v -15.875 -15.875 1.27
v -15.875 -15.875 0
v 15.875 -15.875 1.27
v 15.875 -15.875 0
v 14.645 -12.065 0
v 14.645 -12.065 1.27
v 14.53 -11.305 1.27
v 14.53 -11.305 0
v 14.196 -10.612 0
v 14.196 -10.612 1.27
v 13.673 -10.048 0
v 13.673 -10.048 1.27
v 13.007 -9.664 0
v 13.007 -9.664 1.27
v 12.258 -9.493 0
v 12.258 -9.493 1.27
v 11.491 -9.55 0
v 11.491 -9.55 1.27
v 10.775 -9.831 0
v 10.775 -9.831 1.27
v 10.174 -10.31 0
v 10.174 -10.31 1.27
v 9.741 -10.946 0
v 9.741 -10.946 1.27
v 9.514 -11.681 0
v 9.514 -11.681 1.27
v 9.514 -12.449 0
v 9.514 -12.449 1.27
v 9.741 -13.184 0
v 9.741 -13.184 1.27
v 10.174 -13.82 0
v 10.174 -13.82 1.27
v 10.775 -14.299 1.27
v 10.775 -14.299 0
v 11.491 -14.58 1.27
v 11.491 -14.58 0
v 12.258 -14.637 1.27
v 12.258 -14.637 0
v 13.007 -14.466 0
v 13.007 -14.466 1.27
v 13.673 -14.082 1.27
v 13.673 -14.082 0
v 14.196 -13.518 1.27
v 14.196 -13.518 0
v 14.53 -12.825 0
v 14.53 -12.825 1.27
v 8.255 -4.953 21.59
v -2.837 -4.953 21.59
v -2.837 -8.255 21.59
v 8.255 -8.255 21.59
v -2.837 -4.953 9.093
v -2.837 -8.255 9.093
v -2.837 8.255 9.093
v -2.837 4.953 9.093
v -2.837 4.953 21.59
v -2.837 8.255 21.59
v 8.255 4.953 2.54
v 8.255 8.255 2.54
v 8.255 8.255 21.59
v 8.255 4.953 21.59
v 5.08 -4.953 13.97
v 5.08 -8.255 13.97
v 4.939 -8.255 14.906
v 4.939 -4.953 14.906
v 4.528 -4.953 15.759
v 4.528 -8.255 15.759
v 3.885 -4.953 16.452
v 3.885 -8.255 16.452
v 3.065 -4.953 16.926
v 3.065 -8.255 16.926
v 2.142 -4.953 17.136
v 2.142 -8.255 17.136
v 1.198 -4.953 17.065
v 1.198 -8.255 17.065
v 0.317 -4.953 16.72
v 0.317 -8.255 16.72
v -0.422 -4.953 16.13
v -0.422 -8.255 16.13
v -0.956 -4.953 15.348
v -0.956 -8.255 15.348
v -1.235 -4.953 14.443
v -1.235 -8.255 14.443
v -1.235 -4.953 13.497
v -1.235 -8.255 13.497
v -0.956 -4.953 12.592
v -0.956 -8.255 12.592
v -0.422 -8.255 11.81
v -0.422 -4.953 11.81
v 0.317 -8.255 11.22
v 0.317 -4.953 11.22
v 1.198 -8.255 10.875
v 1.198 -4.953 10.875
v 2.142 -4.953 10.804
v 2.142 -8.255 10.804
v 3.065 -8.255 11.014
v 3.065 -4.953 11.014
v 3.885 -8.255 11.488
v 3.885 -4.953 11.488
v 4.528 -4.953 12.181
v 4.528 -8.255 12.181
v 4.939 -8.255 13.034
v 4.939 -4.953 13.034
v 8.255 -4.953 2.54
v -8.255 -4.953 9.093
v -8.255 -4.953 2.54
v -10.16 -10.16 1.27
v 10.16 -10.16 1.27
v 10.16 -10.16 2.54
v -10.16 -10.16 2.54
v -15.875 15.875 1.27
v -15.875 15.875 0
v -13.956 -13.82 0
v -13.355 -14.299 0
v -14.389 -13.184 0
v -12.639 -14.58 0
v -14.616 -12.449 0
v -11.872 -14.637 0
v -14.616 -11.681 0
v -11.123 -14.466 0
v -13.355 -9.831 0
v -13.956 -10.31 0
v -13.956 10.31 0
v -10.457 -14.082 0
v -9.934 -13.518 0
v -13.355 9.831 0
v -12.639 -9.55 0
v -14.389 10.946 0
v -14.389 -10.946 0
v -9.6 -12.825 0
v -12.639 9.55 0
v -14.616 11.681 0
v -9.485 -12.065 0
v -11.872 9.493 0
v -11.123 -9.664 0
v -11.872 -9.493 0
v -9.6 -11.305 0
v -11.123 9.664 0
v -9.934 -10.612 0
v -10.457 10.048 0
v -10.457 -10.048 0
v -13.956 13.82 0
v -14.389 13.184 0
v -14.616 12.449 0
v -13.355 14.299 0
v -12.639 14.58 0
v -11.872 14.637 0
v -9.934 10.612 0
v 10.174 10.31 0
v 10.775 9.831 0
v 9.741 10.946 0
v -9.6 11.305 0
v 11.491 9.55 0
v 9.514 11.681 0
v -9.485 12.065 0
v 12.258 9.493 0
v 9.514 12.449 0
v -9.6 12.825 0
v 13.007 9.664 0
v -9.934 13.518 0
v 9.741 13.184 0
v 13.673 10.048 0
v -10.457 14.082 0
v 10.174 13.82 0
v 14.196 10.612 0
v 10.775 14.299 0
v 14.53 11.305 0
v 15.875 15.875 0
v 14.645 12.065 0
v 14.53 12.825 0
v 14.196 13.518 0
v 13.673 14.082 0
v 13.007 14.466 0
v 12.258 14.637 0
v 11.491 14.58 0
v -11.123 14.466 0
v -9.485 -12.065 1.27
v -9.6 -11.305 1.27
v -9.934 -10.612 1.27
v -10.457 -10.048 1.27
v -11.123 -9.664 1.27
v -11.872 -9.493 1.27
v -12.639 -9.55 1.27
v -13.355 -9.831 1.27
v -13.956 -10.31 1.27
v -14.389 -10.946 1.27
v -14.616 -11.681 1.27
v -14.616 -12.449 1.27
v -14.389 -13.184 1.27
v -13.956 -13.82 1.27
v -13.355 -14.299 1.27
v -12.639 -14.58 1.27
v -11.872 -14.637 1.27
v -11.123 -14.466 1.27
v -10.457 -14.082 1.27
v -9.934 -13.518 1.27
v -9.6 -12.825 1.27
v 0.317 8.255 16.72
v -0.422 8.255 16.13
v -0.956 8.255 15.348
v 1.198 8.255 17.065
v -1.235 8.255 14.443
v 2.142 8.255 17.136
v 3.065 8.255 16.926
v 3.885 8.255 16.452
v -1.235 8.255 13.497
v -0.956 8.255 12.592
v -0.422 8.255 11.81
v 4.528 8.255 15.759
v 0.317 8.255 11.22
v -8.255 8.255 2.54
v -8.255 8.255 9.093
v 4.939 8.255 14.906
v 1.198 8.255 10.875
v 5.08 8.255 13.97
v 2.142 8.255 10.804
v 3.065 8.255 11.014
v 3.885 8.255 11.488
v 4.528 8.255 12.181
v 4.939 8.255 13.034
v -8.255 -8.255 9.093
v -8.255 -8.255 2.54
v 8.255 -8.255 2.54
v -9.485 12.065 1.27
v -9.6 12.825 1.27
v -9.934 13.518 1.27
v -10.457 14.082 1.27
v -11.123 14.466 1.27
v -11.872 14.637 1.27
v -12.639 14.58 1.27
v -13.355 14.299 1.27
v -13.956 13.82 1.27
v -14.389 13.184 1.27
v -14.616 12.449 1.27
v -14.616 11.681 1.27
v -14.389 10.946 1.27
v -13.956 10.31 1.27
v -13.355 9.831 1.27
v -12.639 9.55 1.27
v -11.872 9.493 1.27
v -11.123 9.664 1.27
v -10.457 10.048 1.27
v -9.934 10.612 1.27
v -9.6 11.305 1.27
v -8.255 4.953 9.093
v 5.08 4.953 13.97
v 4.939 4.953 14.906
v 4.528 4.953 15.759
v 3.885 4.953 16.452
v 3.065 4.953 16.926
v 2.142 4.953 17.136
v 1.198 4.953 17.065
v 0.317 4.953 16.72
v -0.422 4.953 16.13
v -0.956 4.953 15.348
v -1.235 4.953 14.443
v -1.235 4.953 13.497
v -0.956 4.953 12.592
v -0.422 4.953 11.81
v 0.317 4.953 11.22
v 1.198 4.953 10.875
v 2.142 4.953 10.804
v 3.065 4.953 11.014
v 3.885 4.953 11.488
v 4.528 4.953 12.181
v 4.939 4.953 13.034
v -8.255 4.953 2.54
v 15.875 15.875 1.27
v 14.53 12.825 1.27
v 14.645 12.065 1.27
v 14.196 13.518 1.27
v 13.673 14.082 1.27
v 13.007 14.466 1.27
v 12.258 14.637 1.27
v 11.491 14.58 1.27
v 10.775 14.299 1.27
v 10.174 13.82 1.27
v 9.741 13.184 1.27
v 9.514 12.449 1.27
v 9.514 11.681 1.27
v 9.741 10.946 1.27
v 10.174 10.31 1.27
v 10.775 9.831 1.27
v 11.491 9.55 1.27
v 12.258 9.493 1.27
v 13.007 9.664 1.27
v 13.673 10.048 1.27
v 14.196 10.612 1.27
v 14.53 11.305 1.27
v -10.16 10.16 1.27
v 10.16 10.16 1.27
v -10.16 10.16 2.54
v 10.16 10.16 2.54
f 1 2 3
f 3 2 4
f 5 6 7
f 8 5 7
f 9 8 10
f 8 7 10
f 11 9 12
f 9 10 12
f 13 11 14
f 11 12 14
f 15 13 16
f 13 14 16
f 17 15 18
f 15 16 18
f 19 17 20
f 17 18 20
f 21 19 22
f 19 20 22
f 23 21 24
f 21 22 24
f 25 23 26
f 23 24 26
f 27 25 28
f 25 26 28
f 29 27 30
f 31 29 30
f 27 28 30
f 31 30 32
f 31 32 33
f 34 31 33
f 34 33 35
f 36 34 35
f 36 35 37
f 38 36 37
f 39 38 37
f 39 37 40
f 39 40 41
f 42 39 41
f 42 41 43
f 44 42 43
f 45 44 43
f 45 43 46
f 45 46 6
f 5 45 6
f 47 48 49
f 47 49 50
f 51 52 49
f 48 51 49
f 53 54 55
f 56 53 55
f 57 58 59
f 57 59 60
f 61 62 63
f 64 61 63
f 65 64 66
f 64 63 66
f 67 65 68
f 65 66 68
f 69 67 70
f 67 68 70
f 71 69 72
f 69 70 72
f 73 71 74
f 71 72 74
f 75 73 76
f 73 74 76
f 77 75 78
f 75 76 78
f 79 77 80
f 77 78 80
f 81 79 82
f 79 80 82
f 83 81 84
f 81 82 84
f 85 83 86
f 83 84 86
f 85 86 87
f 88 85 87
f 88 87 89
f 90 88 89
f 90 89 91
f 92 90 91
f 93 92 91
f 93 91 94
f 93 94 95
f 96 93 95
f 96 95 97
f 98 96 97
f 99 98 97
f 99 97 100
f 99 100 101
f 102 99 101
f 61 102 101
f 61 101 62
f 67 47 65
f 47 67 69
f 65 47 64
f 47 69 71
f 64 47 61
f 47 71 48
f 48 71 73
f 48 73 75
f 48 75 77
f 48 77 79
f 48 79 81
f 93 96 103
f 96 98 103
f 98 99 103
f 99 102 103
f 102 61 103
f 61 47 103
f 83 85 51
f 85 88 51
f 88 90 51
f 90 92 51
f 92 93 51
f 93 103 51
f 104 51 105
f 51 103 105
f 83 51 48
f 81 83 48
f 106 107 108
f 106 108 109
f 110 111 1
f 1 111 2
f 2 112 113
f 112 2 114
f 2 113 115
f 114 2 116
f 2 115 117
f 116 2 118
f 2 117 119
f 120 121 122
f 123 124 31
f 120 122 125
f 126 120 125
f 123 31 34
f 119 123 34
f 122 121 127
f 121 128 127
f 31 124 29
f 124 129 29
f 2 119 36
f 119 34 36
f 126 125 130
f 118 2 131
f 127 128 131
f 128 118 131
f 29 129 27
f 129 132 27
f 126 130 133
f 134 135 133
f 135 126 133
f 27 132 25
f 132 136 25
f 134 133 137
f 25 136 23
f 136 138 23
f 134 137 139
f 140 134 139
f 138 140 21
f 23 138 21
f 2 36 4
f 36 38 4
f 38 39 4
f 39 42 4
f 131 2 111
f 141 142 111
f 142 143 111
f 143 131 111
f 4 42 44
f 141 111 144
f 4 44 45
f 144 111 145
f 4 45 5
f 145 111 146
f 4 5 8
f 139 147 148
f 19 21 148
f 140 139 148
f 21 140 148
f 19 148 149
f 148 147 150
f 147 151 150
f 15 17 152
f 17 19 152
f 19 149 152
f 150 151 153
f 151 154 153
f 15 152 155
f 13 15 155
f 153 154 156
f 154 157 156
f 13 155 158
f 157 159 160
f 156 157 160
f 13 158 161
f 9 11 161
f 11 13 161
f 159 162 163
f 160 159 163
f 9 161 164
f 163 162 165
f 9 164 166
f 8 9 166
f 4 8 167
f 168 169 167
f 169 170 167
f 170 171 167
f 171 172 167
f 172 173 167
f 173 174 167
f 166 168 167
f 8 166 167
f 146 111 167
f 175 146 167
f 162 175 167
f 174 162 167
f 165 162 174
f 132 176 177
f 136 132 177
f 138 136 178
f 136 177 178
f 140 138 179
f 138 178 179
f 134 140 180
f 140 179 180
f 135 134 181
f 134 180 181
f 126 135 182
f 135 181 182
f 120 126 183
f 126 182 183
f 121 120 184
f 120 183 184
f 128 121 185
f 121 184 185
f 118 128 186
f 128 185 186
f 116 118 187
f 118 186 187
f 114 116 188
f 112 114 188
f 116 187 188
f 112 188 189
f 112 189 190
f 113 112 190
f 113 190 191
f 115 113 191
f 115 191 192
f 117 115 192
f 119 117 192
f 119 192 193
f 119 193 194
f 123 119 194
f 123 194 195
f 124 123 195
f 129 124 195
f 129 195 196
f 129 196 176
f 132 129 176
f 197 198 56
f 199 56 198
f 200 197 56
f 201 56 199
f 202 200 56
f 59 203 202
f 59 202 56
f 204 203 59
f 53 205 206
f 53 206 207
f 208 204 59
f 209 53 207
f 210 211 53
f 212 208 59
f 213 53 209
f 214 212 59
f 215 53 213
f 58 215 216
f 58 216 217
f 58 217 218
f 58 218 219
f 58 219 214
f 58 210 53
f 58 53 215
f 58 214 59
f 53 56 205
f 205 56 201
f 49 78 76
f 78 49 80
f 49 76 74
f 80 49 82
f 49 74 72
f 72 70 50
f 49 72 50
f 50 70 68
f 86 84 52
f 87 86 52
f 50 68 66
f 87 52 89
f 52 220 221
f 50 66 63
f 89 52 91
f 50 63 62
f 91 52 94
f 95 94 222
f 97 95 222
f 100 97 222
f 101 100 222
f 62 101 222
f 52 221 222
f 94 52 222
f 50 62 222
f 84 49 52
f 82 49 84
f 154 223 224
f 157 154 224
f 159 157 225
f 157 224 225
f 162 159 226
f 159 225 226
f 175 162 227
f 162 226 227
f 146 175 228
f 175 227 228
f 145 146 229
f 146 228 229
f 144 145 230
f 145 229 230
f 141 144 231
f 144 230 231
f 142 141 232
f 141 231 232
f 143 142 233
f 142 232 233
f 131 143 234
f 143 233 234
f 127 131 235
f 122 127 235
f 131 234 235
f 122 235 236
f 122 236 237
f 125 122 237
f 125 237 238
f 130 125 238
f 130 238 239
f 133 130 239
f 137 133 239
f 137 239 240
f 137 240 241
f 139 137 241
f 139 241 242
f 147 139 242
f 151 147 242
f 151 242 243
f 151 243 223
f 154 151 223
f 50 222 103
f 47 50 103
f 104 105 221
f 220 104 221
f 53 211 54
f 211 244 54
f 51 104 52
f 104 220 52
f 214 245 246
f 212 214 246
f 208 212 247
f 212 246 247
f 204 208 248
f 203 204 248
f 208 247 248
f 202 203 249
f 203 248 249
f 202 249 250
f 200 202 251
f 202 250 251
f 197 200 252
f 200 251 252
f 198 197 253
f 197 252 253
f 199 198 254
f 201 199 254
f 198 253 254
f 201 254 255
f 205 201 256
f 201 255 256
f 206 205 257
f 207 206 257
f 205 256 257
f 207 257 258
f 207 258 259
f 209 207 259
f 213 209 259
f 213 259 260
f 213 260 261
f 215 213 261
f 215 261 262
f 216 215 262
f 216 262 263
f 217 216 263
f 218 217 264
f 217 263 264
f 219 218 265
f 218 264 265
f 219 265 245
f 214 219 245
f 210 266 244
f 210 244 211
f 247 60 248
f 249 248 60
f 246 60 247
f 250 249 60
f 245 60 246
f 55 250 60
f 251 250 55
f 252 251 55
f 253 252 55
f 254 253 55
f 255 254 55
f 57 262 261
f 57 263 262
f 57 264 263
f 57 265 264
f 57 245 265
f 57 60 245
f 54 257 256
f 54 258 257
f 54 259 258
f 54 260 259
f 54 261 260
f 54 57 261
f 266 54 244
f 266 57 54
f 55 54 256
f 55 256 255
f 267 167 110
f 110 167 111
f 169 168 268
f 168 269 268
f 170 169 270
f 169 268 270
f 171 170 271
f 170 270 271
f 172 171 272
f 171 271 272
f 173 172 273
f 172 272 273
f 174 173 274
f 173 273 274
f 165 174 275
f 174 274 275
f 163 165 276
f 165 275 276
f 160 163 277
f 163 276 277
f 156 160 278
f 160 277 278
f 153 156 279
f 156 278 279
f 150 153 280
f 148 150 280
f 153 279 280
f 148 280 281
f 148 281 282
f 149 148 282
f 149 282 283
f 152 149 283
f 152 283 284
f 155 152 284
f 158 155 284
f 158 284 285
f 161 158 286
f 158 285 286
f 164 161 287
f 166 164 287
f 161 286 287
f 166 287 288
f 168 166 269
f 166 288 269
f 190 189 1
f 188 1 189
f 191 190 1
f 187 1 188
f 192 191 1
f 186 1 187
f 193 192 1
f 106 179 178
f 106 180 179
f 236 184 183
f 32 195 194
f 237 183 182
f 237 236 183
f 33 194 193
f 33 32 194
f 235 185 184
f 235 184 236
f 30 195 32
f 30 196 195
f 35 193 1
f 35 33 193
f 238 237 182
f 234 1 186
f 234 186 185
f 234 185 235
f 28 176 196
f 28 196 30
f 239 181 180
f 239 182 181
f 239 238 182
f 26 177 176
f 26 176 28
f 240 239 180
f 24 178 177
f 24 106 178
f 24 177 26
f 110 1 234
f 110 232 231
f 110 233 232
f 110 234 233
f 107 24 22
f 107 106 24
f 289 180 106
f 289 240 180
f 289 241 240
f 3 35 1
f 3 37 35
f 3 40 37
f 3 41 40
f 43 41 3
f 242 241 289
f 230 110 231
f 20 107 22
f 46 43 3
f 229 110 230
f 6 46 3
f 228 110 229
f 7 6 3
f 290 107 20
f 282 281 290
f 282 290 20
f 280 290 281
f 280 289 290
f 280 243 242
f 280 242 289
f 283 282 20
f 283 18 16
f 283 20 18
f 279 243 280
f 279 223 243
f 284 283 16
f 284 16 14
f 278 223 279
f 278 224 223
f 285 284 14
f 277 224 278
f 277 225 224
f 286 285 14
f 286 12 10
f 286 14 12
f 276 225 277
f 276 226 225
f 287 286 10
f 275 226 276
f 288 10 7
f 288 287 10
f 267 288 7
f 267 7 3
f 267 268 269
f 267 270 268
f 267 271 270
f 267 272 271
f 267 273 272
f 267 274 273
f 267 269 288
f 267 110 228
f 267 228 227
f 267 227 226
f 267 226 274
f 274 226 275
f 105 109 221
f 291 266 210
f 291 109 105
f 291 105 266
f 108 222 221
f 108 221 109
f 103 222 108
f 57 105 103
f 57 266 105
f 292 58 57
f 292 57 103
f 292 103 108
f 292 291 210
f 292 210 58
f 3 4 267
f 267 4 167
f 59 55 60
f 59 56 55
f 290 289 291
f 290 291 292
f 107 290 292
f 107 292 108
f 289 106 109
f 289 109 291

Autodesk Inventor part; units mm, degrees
ref_plane "YZ Plane" through (0, 0, 0) normal (1, 0, 0) x (0, 1, 0)
ref_plane "XZ Plane" through (0, 0, 0) normal (0, 1, 0) x (-1, 0, 0)
ref_plane "XY Plane" through (0, 0, 0) normal (0, 0, 1) x (1, 0, 0)
sketch "Sketch1" plane through (0, 0, 0) normal (0, 0, 1) x (1, 0, 0)
  line L0 (15.875, 15.875) -> (-15.875, 15.875)
  line L1 (-15.875, 15.875) -> (-15.875, -15.875)
  line L2 (-15.875, -15.875) -> (15.875, -15.875)
  line L3 (15.875, -15.875) -> (15.875, 15.875)
  line L4 (15.875, 15.875) -> (-15.875, -15.875) construction
  line L5 (-15.875, 15.875) -> (15.875, -15.875) construction
  point P0 (0, 0)
  dimension "d0" = 31.75
  dimension "d1" = 31.75
extrude "Extrusion1" add sketch "Sketch1" along normal blind 1.27
sketch "Sketch2" plane through (0, 0, 1.27) normal (0, 0, 1) x (1, 0, 0)
  line L0 (-10.16, 10.16) -> (10.16, 10.16)
  line L1 (10.16, 10.16) -> (10.16, -10.16)
  line L2 (10.16, -10.16) -> (-10.16, -10.16)
  line L3 (-10.16, -10.16) -> (-10.16, 10.16)
  line L4 (15.875, 15.875) -> (-15.875, 15.875) projected
  line L5 (15.875, -15.875) -> (15.875, 15.875) projected
  line L6 (-15.875, -15.875) -> (15.875, -15.875) projected
  line L7 (-15.875, 15.875) -> (-15.875, -15.875) projected
  point P0 (0, 0)
  dimension "d4" = 5.715
  dimension "d5" = 5.715
  dimension "d6" = 5.715
  dimension "d7" = 5.715
extrude "Extrusion2" add sketch "Sketch2" along normal blind 1.27 contours L0 L1 L2 L3
sketch "Sketch3" plane through (0, 0, 2.54) normal (0, 0, 1) x (1, 0, 0)
  line L0 (-8.255, 8.255) -> (8.255, 8.255)
  line L1 (8.255, 8.255) -> (8.255, 4.953)
  line L2 (8.255, 4.953) -> (-8.255, 4.953)
  line L3 (-8.255, 4.953) -> (-8.255, 8.255)
  line L4 (10.16, -10.16) -> (10.16, 10.16) projected
  line L5 (-10.16, 10.16) -> (-10.16, -10.16) projected
  line L6 (10.16, 10.16) -> (-10.16, 10.16) projected
  line L7 (-8.255, -8.255) -> (8.255, -8.255)
  line L8 (8.255, -8.255) -> (8.255, -4.953)
  line L9 (8.255, -4.953) -> (-8.255, -4.953)
  line L10 (-8.255, -4.953) -> (-8.255, -8.255)
  line L11 (-10.16, -10.16) -> (10.16, -10.16) projected
  point P0 (0, 0)
  dimension "d10" = 1.905
  dimension "d11" = 1.905
  dimension "d12" = 1.905
  dimension "d14" = 1.905
  dimension "d15" = 1.905
  dimension "d16" = 1.905
  dimension "d39" = 9.906
  dimension "d40" = 3.302
  dimension "d41" = 3.302
extrude "Extrusion3" add sketch "Sketch3" along normal blind 19.05 contours L0 L1 L2 L3 | L10 L9 L8 L7
sketch "Sketch4" plane through (-8.255, -8.255, 2.54) normal (0, -1, 0) x (1, 0, 0)
  circle A0 centre (10.16, 11.43) radius 3.175
  line L0 (0, 19.05) -> (16.51, 19.05) projected
  line L1 (0, 0) -> (0, 19.05) projected
  point P0 (8.255, -2.54)
  dimension "d20" = 6.35
  dimension "d21" = 7.62
  dimension "d44" = 10.16
extrude "Extrusion4" cut sketch "Sketch4" against normal blind 127
sketch "Sketch5" plane through (0, 0, 1.27) normal (0, 0, 1) x (1, 0, 0)
  circle A0 centre (-12.065, 12.065) radius 2.5797
  line L0 (-15.875, -15.875) -> (15.875, -15.875) projected
  line L1 (15.875, -15.875) -> (15.875, 15.875) projected
  circle A1 centre (12.065, 12.065) radius 2.5797
  line L2 (15.875, 15.875) -> (-15.875, 15.875) projected
  line L3 (-15.875, 15.875) -> (-15.875, -15.875) projected
  circle A2 centre (-12.065, -12.065) radius 2.5797
  circle A3 centre (12.065, -12.065) radius 2.5797
  point P0 (0, 0)
  dimension "d24" = 5.1594
  dimension "d28" = 5.1594
  dimension "d29" = 3.81
  dimension "d30" = 3.81
  dimension "d31" = 3.81
  dimension "d32" = 3.81
  dimension "d33" = 5.1594
  dimension "d34" = 3.81
  dimension "d35" = 3.81
  dimension "d36" = 5.1594
  dimension "d37" = 3.81
  dimension "d38" = 3.81
extrude "Extrusion5" cut sketch "Sketch5" against normal blind 12.7 contours A0 | A1 | A2 | A3
sketch "Sketch6" plane through (-8.255, -8.255, 2.54) normal (0, -1, 0) x (1, 0, 0)
  line L0 (0, 0) -> (0, 19.05) projected
  line L1 (0, 19.05) -> (16.51, 19.05) projected
  line L2 (0, 6.5528) -> (5.4184, 6.5528)
  line L3 (5.4184, 6.5528) -> (5.4184, 19.05)
  line L4 (5.4184, 19.05) -> (0, 19.05)
  line L5 (0, 19.05) -> (0, 6.5528)
  point P0 (8.255, -2.54)
extrude "Extrusion6" cut sketch "Sketch6" against normal blind 101.6
equation "\"d5\" = d4"
equation "\"d6\" = d4"
equation "\"d7\" = d4"
equation "\"d11\" = d10"
equation "\"d12\" = d10"
equation "\"d14\" = d10"
equation "\"d15\" = d10"
equation "\"d16\" = d10"
equation "\"d28\" = d24"
equation "\"d30\" = d29"
equation "\"d31\" = d29"
equation "\"d32\" = d29"
equation "\"d33\" = d24"
equation "\"d34\" = d29"
equation "\"d35\" = d29"
equation "\"d36\" = d24"
equation "\"d37\" = d29"
equation "\"d38\" = d29"
properties part number "pneumatics back holder"
